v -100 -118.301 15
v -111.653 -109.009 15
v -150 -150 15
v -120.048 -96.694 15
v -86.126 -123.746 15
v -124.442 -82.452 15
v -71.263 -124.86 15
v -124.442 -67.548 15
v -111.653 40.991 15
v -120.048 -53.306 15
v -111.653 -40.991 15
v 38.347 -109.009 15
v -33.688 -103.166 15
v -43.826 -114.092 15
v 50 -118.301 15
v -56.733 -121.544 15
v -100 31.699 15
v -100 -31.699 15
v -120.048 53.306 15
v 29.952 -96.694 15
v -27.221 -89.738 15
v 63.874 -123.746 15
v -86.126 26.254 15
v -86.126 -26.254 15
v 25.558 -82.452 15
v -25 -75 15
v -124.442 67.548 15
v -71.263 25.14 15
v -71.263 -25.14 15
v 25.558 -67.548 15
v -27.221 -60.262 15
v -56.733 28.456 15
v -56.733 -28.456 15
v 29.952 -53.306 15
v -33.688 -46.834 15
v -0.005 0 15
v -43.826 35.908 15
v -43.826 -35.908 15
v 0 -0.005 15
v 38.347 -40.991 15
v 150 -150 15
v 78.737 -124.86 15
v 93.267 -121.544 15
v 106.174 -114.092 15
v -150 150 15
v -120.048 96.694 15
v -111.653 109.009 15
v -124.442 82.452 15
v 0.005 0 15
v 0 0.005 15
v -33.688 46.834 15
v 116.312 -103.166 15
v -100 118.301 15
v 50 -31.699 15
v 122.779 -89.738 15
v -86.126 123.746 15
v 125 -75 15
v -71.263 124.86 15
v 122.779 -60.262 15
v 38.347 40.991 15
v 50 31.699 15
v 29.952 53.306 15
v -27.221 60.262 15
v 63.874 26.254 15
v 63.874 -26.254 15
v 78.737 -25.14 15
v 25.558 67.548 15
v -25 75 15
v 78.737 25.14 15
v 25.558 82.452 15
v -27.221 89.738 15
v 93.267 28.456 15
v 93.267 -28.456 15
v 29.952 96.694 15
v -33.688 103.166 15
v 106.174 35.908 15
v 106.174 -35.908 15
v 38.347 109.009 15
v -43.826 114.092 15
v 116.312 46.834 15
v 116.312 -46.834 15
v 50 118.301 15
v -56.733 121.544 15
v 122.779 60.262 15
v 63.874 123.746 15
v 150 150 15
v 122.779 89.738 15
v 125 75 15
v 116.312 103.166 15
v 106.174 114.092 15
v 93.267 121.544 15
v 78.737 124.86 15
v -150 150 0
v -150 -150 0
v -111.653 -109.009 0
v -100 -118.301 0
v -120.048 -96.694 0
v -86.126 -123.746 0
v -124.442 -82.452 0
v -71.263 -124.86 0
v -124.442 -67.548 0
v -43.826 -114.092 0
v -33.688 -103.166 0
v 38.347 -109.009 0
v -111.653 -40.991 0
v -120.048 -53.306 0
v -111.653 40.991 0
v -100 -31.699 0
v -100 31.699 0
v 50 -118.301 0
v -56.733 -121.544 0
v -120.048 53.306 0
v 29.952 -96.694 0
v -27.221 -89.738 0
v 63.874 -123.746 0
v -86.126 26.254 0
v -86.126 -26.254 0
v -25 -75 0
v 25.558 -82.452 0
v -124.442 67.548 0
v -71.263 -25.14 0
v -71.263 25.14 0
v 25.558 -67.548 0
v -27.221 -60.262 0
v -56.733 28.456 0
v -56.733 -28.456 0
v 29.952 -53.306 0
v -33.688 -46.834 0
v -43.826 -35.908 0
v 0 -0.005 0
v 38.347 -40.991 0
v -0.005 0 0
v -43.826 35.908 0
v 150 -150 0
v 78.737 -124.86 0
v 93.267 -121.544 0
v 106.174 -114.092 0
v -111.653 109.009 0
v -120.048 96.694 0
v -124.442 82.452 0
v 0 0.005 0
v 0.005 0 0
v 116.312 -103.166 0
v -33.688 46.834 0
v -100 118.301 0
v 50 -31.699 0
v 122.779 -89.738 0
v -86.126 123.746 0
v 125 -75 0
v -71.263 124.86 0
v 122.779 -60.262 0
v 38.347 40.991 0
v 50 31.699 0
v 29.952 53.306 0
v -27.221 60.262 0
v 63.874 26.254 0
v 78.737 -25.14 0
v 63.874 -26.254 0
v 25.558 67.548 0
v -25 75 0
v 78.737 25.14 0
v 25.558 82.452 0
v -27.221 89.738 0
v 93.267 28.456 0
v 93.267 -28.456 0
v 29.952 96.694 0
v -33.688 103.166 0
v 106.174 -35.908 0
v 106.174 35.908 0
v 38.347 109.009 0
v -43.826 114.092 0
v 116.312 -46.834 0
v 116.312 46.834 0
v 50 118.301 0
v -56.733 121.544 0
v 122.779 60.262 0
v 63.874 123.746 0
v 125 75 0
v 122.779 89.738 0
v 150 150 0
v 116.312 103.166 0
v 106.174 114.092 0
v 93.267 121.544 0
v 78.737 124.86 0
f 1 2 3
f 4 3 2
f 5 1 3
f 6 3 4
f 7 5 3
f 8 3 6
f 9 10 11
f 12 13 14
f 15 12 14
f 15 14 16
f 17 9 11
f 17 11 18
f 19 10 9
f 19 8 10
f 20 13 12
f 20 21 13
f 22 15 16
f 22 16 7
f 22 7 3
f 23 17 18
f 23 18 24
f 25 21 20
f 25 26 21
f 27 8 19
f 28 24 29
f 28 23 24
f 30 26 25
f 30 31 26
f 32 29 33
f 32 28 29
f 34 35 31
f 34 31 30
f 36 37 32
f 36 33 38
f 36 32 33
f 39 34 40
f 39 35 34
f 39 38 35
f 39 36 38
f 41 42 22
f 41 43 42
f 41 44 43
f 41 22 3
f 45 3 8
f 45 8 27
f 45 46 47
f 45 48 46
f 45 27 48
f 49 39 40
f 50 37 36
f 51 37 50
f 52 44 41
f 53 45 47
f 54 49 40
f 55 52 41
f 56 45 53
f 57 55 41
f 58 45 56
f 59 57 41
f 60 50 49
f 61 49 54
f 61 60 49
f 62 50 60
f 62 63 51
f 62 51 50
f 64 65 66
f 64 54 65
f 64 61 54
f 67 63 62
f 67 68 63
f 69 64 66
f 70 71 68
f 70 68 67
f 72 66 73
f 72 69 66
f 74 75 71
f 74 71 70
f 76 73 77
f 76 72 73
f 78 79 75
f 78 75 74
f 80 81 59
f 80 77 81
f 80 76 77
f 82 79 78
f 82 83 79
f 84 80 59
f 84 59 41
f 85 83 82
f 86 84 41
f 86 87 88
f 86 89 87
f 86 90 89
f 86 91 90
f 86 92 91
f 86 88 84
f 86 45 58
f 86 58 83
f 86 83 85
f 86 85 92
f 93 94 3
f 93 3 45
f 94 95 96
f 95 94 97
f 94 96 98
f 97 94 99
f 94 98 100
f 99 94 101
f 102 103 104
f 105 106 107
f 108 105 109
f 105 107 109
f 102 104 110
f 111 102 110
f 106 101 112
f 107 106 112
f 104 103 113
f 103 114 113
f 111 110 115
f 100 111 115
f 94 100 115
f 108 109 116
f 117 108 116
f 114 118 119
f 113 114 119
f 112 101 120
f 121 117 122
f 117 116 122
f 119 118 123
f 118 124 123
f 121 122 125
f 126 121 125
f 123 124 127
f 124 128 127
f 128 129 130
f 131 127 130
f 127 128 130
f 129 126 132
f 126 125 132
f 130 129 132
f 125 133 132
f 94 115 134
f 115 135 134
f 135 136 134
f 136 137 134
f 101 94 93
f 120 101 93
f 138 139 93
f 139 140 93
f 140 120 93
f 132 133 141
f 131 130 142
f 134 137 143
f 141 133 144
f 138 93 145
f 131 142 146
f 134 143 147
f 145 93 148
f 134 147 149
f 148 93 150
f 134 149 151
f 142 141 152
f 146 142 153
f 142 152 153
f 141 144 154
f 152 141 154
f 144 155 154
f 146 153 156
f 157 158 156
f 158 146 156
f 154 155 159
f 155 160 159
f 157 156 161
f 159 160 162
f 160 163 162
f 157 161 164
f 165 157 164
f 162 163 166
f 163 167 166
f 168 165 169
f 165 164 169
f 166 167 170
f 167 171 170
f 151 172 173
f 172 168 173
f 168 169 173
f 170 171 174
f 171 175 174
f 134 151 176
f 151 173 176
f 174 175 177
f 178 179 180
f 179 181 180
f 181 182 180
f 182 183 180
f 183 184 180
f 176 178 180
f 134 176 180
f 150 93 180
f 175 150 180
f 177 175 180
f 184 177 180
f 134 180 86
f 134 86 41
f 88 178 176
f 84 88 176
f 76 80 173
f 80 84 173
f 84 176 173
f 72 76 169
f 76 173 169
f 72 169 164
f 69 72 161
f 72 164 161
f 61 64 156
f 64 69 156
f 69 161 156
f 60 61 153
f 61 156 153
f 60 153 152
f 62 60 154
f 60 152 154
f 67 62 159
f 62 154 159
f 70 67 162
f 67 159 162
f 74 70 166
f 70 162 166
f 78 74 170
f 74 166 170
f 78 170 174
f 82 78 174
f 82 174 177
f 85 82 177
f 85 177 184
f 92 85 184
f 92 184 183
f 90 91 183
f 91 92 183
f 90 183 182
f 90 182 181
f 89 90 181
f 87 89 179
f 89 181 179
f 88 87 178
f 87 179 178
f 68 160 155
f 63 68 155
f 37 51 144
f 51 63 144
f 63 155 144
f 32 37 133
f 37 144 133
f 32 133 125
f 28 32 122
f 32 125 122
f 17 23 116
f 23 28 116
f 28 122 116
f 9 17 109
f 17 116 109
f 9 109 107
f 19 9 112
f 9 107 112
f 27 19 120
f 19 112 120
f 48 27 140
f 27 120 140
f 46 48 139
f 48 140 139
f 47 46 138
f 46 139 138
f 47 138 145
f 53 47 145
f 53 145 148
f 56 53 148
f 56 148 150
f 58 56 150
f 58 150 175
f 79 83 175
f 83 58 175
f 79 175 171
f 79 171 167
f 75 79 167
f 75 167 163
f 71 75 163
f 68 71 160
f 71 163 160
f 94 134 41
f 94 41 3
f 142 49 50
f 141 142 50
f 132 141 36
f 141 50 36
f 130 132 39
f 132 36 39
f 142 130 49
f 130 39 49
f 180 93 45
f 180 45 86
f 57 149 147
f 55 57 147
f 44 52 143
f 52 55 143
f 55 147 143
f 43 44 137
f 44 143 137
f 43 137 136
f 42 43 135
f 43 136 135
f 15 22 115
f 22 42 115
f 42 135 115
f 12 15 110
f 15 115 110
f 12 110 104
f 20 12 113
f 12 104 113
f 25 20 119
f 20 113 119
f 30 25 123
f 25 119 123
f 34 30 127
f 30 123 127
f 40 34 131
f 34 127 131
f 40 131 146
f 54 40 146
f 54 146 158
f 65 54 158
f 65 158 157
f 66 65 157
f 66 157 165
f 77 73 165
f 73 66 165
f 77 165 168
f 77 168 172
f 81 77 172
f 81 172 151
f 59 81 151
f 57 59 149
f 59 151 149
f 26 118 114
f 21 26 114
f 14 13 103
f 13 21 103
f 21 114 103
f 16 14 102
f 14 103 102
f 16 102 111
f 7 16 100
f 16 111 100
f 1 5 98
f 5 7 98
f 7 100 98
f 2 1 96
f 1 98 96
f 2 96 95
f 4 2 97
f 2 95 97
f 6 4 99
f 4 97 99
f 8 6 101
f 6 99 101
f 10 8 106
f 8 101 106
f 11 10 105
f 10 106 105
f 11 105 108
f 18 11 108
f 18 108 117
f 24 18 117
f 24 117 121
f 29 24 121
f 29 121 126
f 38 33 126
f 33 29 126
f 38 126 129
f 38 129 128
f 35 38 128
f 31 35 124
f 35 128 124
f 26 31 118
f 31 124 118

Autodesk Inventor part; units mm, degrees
ref_plane "YZ Plane" through (0, 0, 0) normal (1, 0, 0) x (0, 1, 0)
ref_plane "XZ Plane" through (0, 0, 0) normal (0, 1, 0) x (-1, 0, 0)
ref_plane "XY Plane" through (0, 0, 0) normal (0, 0, 1) x (1, 0, 0)
sketch "スケッチ1" plane through (0, 0, 0) normal (0, 0, 1) x (1, 0, 0)
  line L0 (-150, 150) -> (150, 150)
  line L1 (150, 150) -> (150, -150)
  line L2 (150, -150) -> (-150, -150)
  line L3 (-150, -150) -> (-150, 150)
  circle A0 centre (-75, 75) radius 50
  circle A1 centre (-75, -75) radius 50
  circle A2 centre (75, -75) radius 50
  circle A3 centre (75, 75) radius 50
  point P0 (0, 0)
  point P1 (0, 0)
  dimension "d0" = 300
  dimension "d1" = 100
  dimension "d2" = 100
  dimension "d3" = 100
  dimension "d4" = 100
  dimension "d5" = 150
  dimension "d6" = 150
  dimension "d7" = 75
  dimension "d8" = 75
extrude "押し出し1" add sketch "スケッチ1" along normal blind 15
sketch "スケッチ2" plane through (0, 0, 15) normal (0, 0, 1) x (1, 0, 0)
  circle A0 centre (0, 0) radius 0.005
  dimension "d11" = 0.01
extrude "押し出し2" cut sketch "スケッチ2" against normal through all
properties part number "障害物、丸４"
